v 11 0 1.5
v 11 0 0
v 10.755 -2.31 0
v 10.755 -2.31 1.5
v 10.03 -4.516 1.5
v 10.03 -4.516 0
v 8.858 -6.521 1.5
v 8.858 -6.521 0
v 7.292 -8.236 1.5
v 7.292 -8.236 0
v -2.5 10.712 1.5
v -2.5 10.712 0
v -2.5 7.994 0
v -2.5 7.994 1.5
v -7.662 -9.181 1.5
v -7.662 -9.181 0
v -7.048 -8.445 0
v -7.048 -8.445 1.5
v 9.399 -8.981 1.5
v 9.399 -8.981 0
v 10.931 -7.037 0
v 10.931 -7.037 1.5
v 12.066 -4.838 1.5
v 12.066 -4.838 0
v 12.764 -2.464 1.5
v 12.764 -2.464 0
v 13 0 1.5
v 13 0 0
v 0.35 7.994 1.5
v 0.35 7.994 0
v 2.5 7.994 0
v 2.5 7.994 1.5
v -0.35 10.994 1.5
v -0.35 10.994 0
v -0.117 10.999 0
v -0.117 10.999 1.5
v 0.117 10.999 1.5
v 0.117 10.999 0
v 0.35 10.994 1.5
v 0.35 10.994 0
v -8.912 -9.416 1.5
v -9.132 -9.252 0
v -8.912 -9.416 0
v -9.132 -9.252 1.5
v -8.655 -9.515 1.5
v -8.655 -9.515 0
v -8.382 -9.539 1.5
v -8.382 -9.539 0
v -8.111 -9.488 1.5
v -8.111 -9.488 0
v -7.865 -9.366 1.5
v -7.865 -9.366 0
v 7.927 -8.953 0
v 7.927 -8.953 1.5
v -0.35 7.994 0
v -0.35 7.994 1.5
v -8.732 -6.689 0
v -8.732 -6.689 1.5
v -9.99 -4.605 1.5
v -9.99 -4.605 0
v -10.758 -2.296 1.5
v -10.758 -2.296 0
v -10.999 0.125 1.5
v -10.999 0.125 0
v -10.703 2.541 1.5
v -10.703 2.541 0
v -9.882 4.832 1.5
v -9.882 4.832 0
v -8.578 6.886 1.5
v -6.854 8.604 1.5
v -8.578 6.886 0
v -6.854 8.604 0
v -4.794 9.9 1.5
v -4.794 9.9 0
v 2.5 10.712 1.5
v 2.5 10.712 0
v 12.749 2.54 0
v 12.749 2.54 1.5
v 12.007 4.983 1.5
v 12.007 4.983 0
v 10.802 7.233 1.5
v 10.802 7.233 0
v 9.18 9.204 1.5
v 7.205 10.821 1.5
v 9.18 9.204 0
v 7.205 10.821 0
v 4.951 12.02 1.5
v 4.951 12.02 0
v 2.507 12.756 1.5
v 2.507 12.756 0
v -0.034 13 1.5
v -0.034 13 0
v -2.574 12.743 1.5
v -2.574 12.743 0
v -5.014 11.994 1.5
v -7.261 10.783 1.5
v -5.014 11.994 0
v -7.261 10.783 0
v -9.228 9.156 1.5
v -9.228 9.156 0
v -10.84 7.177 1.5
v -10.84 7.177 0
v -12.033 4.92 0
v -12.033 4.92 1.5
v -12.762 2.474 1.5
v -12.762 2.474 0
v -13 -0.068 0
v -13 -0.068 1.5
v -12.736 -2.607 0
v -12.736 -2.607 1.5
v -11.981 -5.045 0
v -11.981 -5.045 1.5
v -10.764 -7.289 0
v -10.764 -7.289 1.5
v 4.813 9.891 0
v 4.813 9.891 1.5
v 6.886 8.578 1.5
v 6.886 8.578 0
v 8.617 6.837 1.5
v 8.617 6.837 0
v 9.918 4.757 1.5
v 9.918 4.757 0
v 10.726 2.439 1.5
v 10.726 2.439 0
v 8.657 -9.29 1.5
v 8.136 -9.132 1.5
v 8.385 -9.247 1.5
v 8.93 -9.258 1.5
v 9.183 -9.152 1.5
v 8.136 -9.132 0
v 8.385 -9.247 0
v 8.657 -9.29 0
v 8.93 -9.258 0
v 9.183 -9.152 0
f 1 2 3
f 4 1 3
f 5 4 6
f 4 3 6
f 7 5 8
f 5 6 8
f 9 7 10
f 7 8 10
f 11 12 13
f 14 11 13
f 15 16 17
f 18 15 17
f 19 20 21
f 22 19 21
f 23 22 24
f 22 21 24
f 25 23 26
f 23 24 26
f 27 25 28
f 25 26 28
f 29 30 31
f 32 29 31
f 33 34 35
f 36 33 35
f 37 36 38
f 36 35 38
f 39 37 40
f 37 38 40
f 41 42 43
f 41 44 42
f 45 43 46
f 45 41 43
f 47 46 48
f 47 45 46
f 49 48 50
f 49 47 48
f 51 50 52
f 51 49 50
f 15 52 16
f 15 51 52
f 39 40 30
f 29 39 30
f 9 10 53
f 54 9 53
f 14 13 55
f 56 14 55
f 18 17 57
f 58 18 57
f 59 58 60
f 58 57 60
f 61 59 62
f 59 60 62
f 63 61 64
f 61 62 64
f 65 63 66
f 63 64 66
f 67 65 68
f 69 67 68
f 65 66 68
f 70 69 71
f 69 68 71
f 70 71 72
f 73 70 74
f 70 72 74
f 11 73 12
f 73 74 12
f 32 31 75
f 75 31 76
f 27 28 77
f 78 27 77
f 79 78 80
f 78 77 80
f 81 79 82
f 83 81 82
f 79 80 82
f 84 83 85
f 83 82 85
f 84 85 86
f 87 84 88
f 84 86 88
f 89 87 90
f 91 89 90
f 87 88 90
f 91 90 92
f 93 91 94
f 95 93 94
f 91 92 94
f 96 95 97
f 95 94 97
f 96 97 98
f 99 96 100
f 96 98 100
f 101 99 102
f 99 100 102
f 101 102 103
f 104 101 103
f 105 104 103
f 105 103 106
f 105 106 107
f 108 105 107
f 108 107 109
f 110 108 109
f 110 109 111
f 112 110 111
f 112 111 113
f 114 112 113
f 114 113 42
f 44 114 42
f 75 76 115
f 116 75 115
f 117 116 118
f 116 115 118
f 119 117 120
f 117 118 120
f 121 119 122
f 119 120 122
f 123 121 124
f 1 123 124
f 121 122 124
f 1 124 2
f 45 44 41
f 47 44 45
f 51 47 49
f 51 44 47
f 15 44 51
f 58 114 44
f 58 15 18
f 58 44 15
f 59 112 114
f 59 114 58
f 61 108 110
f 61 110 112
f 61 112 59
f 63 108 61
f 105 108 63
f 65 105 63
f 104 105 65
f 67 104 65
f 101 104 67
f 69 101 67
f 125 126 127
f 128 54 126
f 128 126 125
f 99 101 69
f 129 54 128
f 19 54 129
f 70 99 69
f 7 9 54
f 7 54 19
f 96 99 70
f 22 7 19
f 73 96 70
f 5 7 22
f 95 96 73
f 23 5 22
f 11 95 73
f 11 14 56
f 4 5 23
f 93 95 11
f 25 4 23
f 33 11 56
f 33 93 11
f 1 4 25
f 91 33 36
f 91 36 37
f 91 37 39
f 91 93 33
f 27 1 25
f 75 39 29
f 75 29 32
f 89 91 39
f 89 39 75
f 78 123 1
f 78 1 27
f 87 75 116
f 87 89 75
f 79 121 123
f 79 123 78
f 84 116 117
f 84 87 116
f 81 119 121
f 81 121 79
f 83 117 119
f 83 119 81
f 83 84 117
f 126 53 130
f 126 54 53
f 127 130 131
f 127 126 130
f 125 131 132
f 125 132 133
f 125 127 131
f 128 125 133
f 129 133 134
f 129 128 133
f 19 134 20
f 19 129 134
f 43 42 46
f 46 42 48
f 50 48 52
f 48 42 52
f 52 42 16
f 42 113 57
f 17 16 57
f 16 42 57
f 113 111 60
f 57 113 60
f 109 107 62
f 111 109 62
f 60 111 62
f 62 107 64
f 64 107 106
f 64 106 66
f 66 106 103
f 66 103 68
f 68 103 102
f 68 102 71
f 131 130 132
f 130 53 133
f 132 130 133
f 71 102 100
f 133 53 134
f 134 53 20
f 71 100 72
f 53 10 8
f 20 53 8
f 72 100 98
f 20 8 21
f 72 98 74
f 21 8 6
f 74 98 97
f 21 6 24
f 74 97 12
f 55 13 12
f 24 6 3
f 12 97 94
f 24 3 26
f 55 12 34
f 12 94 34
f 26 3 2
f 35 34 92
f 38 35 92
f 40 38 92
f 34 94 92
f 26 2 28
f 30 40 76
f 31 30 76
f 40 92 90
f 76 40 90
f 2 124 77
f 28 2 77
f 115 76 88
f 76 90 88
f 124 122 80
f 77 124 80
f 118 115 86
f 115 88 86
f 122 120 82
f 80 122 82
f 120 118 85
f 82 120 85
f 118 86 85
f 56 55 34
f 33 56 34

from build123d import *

# Parameters (mm, degrees)
F1_DEPTH = 1.5
F2_R     = 1


with BuildPart() as f1:
    # F0 (on Top) → F1 (new body)
    with BuildSketch(Plane.XY):
        with BuildLine():
            ThreePointArc((2.5, 10.7121426428), (8.6168439698, 6.8373971656), (11, 0))
            ThreePointArc((11, 0), (10.0302093156, -4.5160714217), (7.2918361662, -8.2358439352))
            Line((7.2918361662, -8.2358439352), (8.61762456, -9.7332701053))
            ThreePointArc((8.61762456, -9.7332701053), (11.8538837366, -5.3371753166), (13, 0))
            ThreePointArc((13, 0), (-5.5098347525, 11.7746219048), (-8.3294955385, -9.9809570721))
            Line((-8.3294955385, -9.9809570721), (-7.0480346864, -8.4454252148))
            ThreePointArc((-7.0480346864, -8.4454252148), (-10.7025390982, 2.5407984674), (-2.5, 10.7121426428))
            ThreePointArc((-2.5, 10.7121426428), (-1.4319729731, 10.9063950692), (-0.35, 10.9944304082))
            ThreePointArc((-0.35, 10.9944304082), (0, 11), (0.35, 10.9944304082))
            ThreePointArc((0.35, 10.9944304082), (1.4319729731, 10.9063950692), (2.5, 10.7121426428))
        make_face()
        with BuildLine():
            Line((-0.35, 7.9944304082), (-0.35, 10.9944304082))
            ThreePointArc((-0.35, 10.9944304082), (-1.4319729731, 10.9063950692), (-2.5, 10.7121426428))
            Line((-2.5, 10.7121426428), (-2.5, 7.9944304082))
            Line((-2.5, 7.9944304082), (-0.35, 7.9944304082))
        make_face()
        with BuildLine():
            Line((2.5, 7.9944304082), (2.5, 10.7121426428))
            ThreePointArc((2.5, 10.7121426428), (1.4319729731, 10.9063950692), (0.35, 10.9944304082))
            Line((0.35, 10.9944304082), (0.35, 7.9944304082))
            Line((0.35, 7.9944304082), (2.5, 7.9944304082))
        make_face()
    extrude(amount=F1_DEPTH)

    # F2
    f2_edges = [f1.edges().sort_by_distance(p)[0] for p in [
        (-8.329496, -9.980957, 0.75),
        (8.617625, -9.73327, 0.75),
    ]]
    fillet(f2_edges, radius=F2_R)


solid = f1.part
